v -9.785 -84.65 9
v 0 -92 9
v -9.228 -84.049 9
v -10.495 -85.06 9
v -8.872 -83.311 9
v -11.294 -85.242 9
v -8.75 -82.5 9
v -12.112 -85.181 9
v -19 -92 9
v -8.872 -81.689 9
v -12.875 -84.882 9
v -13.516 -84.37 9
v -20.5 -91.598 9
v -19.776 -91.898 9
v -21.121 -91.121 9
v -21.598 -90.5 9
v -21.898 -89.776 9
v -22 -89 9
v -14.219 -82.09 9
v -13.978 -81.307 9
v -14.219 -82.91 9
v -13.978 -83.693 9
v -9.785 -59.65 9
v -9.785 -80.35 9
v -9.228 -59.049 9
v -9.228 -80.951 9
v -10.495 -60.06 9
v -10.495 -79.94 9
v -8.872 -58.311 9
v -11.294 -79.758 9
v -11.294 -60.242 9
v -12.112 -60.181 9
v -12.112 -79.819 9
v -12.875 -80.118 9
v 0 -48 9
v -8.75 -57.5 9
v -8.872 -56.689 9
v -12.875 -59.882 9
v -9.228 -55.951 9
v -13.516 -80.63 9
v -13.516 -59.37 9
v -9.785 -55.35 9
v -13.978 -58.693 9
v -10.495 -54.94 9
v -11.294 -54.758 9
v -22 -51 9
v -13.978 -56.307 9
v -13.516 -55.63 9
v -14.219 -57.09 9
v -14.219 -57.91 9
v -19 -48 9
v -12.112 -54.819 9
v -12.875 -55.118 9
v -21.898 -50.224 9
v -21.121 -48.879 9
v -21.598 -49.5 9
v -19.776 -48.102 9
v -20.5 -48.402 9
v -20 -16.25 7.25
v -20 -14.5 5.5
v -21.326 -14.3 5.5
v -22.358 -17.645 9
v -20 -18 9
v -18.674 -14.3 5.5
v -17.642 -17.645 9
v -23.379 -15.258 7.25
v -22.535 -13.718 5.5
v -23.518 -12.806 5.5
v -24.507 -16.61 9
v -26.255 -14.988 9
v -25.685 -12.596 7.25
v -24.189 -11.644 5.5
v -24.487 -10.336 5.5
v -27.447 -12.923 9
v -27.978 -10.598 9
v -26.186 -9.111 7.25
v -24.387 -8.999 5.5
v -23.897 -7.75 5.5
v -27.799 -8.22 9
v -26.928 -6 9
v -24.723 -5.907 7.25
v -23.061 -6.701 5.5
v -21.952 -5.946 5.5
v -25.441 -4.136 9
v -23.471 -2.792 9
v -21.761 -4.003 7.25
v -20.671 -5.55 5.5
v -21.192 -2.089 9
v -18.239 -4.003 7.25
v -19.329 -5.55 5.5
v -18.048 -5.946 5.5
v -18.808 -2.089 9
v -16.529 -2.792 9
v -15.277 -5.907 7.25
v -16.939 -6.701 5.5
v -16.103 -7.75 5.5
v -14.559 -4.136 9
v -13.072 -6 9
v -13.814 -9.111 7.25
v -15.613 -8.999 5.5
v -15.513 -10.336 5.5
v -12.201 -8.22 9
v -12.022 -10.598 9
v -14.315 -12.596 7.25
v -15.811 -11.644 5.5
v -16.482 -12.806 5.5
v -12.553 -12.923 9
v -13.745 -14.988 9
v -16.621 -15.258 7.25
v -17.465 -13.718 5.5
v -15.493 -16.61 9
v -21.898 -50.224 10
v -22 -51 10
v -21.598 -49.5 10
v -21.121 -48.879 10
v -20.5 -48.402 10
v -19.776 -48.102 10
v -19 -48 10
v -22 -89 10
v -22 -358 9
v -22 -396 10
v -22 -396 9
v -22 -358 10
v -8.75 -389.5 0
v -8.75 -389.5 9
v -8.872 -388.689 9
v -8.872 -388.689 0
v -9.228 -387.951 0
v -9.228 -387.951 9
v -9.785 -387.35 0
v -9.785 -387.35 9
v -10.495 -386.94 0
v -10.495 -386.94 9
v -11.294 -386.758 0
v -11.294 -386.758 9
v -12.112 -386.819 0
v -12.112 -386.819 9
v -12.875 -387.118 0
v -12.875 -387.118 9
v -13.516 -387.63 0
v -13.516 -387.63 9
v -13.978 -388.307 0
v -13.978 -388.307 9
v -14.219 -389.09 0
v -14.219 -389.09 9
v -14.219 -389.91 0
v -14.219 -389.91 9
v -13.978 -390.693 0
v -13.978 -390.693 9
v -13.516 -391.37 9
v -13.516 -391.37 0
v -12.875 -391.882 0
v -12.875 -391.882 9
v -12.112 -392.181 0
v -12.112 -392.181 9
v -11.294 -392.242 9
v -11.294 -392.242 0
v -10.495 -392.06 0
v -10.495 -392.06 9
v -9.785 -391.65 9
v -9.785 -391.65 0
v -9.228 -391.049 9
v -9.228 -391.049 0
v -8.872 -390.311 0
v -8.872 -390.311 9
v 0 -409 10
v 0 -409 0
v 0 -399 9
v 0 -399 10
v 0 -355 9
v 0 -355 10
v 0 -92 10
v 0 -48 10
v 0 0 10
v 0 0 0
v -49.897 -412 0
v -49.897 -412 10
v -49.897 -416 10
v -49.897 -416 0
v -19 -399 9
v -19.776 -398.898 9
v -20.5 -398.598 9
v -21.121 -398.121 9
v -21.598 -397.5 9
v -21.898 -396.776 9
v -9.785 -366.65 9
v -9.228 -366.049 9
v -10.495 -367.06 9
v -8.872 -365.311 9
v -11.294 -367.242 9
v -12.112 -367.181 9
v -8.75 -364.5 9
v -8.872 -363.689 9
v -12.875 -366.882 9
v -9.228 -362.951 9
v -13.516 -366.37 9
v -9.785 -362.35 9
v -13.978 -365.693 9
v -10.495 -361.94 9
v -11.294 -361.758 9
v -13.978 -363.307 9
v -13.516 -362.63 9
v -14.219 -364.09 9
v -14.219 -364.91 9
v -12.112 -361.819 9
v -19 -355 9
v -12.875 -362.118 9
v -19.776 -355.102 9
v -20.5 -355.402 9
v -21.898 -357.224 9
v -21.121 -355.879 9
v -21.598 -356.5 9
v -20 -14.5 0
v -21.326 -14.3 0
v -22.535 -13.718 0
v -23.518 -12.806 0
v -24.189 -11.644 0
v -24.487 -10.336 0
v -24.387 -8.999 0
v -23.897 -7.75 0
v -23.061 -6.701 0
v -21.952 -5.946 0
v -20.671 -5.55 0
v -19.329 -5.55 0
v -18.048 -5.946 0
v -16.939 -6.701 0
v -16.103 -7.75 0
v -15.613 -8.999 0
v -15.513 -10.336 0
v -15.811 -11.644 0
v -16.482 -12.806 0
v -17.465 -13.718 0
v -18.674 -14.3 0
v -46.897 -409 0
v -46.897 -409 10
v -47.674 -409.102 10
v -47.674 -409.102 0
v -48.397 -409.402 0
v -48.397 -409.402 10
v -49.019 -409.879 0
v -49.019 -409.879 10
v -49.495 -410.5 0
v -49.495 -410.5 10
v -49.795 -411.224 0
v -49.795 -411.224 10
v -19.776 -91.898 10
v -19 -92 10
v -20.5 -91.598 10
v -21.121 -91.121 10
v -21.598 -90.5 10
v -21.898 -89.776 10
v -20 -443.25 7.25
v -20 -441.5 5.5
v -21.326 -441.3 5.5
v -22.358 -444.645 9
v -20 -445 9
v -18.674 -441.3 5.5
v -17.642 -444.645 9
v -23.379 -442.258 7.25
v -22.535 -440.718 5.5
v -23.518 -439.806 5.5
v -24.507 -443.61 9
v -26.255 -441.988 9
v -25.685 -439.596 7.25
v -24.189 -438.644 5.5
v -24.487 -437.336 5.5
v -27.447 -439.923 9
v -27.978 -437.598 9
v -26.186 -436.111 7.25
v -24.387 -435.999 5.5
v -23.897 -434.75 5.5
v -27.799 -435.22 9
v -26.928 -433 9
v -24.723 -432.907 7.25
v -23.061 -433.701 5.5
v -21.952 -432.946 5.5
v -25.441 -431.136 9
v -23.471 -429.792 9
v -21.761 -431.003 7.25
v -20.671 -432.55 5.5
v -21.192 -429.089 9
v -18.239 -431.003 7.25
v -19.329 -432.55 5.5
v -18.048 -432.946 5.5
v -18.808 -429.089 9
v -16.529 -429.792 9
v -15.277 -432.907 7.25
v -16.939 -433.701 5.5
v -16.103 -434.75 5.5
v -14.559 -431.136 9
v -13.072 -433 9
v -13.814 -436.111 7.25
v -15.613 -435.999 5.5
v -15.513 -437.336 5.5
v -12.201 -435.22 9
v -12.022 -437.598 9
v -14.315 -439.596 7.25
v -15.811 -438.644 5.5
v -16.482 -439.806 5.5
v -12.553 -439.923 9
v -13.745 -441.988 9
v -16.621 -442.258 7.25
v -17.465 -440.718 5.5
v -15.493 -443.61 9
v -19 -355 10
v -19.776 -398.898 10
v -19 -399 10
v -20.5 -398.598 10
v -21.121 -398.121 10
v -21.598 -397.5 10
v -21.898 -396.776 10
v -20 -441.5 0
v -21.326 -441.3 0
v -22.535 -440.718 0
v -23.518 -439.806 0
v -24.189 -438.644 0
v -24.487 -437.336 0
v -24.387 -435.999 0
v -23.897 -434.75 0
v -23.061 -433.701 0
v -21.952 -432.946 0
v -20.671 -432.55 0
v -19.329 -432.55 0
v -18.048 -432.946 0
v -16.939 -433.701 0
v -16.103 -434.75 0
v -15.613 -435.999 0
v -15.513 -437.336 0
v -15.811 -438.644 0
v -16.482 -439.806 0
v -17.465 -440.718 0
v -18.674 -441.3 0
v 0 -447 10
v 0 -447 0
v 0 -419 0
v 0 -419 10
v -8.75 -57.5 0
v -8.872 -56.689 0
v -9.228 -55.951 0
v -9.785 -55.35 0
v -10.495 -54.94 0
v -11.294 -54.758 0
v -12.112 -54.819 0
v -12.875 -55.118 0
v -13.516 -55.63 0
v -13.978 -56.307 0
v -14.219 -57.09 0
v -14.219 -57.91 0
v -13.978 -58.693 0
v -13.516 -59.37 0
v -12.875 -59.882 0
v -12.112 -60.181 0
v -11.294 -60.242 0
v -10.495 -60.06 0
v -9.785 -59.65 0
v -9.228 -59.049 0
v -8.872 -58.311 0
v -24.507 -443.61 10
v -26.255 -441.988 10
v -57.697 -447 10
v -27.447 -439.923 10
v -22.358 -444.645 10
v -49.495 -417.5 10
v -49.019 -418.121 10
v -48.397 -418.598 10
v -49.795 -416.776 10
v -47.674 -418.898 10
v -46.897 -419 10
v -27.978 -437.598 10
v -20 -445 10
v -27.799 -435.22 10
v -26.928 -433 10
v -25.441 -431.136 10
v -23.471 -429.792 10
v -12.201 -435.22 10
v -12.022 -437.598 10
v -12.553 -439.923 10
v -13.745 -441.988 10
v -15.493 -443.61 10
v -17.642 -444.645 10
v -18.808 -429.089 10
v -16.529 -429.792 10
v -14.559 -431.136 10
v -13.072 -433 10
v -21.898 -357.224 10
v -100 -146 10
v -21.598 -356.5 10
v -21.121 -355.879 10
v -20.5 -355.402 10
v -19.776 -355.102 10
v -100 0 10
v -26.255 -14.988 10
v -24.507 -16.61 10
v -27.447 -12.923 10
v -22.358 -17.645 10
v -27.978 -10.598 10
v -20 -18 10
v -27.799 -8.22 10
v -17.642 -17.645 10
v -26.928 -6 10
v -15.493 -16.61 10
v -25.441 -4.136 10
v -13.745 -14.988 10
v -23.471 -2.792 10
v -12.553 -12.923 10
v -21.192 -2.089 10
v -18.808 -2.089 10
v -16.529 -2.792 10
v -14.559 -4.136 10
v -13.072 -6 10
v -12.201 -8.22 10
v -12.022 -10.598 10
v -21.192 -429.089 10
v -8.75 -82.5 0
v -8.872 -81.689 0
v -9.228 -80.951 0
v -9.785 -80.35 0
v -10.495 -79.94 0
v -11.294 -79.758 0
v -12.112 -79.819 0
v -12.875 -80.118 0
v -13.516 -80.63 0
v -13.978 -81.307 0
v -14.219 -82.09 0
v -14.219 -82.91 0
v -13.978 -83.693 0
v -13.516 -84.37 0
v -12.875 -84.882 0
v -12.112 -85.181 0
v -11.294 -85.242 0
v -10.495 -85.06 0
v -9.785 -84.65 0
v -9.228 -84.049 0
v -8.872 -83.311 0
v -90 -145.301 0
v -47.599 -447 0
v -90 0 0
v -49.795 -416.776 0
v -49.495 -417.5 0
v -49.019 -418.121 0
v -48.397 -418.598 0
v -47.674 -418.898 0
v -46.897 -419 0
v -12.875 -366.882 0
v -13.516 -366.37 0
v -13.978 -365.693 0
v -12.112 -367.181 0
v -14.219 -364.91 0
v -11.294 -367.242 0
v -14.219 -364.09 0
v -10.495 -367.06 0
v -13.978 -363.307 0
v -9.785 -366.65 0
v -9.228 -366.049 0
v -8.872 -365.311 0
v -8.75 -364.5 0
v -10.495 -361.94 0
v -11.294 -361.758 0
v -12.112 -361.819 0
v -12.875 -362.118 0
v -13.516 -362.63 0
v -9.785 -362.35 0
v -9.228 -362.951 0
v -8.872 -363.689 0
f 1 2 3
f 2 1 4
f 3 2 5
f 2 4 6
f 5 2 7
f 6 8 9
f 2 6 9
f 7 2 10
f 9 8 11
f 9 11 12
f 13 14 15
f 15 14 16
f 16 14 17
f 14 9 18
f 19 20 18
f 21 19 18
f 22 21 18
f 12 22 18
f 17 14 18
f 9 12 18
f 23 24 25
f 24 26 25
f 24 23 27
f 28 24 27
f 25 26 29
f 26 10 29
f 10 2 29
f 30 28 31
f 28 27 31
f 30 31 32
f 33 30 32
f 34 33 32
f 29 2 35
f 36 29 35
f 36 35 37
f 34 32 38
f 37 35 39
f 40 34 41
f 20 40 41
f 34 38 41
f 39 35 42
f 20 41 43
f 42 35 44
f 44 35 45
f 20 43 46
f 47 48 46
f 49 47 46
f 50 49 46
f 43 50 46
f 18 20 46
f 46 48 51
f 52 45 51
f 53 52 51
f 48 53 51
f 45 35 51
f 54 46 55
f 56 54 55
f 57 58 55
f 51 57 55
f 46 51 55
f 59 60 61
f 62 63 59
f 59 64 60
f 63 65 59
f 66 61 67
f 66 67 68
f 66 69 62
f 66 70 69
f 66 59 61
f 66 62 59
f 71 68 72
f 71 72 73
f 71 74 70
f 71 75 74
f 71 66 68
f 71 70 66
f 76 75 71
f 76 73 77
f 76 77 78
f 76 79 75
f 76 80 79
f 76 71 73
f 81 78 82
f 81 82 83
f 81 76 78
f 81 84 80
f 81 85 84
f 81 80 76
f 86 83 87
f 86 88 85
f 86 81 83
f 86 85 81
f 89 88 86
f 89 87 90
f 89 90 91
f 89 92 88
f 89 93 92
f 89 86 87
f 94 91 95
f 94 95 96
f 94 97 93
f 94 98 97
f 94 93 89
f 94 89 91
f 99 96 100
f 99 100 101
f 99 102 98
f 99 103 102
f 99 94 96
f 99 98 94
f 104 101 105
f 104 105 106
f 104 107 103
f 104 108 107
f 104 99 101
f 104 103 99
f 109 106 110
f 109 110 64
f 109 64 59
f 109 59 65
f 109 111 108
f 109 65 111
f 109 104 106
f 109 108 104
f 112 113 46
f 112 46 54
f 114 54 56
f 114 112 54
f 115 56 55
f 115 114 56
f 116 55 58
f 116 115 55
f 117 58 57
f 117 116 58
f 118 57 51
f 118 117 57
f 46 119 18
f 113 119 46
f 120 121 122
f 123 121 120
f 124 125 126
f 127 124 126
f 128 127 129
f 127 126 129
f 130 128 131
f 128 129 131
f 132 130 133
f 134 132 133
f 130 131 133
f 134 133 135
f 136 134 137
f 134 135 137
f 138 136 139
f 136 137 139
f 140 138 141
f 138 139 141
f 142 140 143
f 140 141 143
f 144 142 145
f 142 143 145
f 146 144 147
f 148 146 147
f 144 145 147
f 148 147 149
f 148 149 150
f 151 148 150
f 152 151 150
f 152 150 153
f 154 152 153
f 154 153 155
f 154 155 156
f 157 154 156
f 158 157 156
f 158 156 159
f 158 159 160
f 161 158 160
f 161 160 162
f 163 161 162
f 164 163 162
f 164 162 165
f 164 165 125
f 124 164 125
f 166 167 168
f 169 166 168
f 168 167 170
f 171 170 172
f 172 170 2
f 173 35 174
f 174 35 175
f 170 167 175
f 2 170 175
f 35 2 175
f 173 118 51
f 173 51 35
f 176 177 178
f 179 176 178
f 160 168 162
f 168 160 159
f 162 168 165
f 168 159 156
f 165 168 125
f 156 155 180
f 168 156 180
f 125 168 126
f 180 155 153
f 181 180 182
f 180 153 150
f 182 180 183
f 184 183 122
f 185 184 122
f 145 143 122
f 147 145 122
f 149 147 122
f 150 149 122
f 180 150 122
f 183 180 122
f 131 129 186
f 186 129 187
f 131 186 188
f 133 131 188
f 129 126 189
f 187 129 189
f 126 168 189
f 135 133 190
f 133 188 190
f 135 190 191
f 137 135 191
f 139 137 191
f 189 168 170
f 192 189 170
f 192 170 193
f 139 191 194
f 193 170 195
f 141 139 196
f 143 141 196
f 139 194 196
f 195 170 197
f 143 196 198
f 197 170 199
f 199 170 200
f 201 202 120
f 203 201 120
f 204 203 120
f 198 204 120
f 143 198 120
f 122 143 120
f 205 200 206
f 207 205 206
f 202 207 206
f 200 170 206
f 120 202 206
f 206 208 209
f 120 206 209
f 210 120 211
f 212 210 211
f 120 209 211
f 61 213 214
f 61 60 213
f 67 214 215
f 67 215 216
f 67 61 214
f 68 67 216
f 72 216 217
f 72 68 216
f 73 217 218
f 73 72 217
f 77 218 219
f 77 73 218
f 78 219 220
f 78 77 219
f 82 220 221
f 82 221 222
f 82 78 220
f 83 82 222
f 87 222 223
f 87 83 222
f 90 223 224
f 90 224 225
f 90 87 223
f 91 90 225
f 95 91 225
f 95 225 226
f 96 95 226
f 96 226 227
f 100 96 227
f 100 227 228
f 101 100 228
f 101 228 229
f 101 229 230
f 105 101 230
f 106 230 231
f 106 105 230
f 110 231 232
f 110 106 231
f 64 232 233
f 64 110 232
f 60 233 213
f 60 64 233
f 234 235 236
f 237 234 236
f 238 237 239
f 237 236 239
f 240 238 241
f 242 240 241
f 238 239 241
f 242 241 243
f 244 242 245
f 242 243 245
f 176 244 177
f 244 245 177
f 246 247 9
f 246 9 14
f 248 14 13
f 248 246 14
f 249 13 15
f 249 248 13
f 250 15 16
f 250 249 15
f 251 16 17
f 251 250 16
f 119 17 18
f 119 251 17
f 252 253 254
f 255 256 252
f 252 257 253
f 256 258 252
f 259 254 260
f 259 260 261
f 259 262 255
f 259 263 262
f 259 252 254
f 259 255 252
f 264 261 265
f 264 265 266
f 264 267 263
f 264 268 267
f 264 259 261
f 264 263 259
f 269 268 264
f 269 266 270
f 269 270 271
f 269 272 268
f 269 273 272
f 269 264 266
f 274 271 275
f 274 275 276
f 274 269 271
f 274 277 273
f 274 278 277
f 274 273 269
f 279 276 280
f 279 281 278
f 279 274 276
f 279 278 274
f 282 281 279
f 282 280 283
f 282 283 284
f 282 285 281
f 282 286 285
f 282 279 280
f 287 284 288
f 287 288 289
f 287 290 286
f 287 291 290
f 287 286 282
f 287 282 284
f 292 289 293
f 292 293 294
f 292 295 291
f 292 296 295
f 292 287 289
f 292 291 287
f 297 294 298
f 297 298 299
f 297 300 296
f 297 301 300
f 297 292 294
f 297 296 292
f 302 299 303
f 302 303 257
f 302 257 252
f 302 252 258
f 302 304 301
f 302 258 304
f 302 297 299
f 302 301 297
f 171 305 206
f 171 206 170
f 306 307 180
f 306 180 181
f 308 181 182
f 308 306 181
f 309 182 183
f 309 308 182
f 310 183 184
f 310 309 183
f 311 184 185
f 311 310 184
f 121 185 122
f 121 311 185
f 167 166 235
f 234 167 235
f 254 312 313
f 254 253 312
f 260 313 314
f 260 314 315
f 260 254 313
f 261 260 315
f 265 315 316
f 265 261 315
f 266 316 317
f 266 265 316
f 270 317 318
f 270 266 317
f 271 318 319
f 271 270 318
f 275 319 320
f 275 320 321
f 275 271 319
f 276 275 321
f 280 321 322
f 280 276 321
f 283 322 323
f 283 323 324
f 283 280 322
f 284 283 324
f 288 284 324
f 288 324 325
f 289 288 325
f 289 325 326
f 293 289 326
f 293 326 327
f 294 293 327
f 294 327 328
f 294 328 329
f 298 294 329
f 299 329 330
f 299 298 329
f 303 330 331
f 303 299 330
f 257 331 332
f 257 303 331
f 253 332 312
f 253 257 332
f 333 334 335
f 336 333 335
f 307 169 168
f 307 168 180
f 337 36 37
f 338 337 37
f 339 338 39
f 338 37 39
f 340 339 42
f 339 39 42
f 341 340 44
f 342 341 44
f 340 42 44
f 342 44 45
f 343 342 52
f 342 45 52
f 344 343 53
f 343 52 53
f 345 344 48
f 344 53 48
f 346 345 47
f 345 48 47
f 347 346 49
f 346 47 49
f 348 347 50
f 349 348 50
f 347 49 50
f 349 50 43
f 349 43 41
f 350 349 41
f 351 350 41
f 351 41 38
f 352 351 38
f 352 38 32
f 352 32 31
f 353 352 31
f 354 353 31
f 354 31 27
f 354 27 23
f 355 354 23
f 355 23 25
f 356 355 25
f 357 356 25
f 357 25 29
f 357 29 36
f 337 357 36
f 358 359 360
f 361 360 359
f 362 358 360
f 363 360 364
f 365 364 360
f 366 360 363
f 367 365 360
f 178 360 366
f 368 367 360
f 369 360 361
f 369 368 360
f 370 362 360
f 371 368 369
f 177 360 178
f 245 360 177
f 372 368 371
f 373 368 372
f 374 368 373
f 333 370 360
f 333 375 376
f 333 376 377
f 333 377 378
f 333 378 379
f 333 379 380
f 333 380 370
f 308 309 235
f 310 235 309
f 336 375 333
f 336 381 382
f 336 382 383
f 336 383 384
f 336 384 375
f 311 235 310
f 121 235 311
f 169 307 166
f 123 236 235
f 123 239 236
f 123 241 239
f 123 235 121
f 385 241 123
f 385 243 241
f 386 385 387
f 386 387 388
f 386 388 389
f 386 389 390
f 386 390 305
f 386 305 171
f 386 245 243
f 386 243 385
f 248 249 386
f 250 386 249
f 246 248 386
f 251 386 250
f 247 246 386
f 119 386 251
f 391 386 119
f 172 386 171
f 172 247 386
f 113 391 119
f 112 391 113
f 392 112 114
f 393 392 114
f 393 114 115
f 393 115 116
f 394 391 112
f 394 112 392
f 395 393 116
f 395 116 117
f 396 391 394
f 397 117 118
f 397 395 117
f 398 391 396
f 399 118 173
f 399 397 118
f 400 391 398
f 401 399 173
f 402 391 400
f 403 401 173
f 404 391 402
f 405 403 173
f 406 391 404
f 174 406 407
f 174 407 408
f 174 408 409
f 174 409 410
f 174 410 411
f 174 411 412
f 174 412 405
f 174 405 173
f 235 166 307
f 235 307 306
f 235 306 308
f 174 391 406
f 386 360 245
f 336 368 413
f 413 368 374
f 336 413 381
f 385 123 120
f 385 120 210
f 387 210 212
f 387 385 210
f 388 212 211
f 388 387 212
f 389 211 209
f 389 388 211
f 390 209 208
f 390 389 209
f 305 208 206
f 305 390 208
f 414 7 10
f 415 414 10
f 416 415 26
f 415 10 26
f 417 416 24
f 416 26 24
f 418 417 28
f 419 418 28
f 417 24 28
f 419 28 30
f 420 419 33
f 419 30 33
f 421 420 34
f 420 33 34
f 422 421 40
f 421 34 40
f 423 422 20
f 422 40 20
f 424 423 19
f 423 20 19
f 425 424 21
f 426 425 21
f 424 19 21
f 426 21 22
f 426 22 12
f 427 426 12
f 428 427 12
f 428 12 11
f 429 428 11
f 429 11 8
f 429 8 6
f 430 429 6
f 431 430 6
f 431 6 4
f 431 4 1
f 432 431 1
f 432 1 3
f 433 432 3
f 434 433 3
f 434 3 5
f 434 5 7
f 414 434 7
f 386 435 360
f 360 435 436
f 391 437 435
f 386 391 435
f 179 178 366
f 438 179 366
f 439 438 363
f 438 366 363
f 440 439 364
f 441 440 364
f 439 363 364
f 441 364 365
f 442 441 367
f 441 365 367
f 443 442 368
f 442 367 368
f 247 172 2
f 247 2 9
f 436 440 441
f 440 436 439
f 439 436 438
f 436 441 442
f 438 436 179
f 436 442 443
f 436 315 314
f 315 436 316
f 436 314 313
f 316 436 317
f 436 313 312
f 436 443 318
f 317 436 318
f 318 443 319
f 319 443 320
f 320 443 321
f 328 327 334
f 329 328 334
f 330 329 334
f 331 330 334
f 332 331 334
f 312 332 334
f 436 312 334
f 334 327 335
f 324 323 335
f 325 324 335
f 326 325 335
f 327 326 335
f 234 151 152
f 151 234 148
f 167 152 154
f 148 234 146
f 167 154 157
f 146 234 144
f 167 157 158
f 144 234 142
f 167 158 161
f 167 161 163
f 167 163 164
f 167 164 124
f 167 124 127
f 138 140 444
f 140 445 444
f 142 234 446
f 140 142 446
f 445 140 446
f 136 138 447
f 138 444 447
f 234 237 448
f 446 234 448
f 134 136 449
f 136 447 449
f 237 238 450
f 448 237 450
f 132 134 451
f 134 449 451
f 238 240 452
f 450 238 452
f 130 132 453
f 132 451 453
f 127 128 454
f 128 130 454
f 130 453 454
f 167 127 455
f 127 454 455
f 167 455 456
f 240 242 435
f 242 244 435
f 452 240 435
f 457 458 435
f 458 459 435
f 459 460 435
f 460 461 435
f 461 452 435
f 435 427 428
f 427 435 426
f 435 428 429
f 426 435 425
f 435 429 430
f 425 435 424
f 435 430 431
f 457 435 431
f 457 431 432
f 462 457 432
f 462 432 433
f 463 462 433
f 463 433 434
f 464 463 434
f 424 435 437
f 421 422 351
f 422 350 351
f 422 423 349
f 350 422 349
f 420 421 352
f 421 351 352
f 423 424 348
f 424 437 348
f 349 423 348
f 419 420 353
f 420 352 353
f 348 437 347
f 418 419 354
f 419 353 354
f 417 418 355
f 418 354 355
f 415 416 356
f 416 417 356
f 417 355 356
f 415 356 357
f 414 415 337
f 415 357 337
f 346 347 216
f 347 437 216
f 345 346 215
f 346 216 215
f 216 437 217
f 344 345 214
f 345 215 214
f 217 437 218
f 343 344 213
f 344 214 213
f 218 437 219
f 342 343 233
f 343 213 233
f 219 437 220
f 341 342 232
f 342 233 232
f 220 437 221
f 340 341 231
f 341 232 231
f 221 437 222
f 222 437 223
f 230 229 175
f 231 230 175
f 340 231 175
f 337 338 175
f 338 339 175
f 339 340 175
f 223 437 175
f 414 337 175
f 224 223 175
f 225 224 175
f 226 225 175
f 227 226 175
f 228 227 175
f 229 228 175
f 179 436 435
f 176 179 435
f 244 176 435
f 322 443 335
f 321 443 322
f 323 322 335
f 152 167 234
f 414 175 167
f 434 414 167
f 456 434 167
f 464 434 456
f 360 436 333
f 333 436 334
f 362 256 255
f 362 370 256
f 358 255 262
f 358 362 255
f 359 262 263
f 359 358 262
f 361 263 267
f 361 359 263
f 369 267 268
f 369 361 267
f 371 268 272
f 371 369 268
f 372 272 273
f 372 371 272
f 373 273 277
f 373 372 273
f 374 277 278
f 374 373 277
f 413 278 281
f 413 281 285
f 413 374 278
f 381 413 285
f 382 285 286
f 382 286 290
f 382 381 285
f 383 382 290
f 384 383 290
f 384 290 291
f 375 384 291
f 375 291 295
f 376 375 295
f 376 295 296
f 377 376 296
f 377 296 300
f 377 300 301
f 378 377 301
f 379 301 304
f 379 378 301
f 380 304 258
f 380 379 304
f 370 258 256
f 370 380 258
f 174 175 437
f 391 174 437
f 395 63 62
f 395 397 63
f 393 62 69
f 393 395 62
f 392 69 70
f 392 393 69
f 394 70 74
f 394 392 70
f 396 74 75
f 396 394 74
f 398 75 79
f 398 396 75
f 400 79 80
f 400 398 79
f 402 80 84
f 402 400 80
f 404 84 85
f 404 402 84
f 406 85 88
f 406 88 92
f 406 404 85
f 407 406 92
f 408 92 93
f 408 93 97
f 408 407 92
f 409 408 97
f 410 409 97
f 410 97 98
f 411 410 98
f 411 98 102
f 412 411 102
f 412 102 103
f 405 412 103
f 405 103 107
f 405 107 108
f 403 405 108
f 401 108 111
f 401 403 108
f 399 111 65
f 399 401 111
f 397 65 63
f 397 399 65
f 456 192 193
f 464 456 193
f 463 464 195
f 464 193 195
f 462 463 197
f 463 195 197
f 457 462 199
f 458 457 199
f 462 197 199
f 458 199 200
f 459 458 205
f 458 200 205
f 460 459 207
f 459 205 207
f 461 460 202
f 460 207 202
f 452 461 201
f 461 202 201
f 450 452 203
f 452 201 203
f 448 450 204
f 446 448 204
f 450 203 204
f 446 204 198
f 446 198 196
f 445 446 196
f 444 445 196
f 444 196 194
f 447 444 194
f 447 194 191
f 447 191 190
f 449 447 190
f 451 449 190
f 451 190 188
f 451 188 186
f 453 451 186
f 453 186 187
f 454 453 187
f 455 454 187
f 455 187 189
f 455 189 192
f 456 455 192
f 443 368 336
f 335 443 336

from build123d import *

# Parameters (mm, degrees)
BOSS_EXTRUDE1_DEPTH                          = 10
CHAMFER1_SIZE                                = 10
CSK_FOR_M8_HEX_SOCKET_COUNTERSUNK_HE_2_COUNT = 2
CSK_FOR_M8_HEX_SOCKET_COUNTERSUNK_HE_2_PITCH = 427
CUT_EXTRUDE1_DEPTH                           = 30
CUT_EXTRUDE2_DEPTH                           = 1
SKETCH6_R                                    = 2.75
CUT_EXTRUDE3_DEPTH                           = 459.137533935


with BuildPart() as part:
    # Sketch1 → Boss-Extrude1 (new body)
    with BuildSketch(Plane.XY):
        Polygon((0, 0), (-100, 0), (-100, -146), (-57.697208755, -447), (0, -447), align=None)
    extrude(amount=BOSS_EXTRUDE1_DEPTH)

    # Chamfer1
    chamfer1_edges = [part.edges().sort_by_distance(p)[0] for p in [
        (-78.848604377, -296.5, 0),
        (-100, -73, 0),
    ]]
    chamfer(chamfer1_edges, length=CHAMFER1_SIZE - 0.0001)  # a hair under: the kernel refuses the full size

    # Sketch3 → CSK for M8 Hex Socket Countersunk Head Screw1 (revolve, cut)
    with BuildSketch(Plane(origin=(-20, -10, 10), x_dir=(0, -1, 0), z_dir=(1, 0, 0))):
        Polygon((0, 0), (0, 10), (4.5, 10), (4.5, 4.5), (8, 1), (8, 0), align=None)
    csk_for_m8_hex_socket_countersunk_head_s = revolve(axis=Axis((-20, -10, 16.35), (0, 0, -1)), mode=Mode.SUBTRACT)

    # CSK for M8 Hex Socket Countersunk He 2: CSK for M8 Hex Socket Countersunk Head Screw1 ×2
    with Locations(*[(0, -i * CSK_FOR_M8_HEX_SOCKET_COUNTERSUNK_HE_2_PITCH, 0) for i in range(1, CSK_FOR_M8_HEX_SOCKET_COUNTERSUNK_HE_2_COUNT)]):
        add(csk_for_m8_hex_socket_countersunk_head_s, mode=Mode.SUBTRACT)

    # Sketch4 → Cut-Extrude1 (cut)
    with BuildSketch(Plane.XY.offset(10)):
        with BuildLine():
            Line((0, -409), (-46.897208755, -409))
            ThreePointArc((-46.897208755, -409), (-49.018529098, -409.878679656), (-49.897208755, -412))
            Line((-49.897208755, -412), (-49.897208755, -416))
            ThreePointArc((-49.897208755, -416), (-49.018529098, -418.121320344), (-46.897208755, -419))
            Line((-46.897208755, -419), (0, -419))
            Line((0, -419), (0, -409))
        make_face()
    extrude(amount=-CUT_EXTRUDE1_DEPTH, mode=Mode.SUBTRACT)

    # Sketch5 → Cut-Extrude2 (cut)
    with BuildSketch(Plane.XY.offset(10)):
        with BuildLine():
            Line((-19, -48), (0, -48))
            Line((0, -48), (0, -92))
            Line((0, -92), (-19, -92))
            ThreePointArc((-19, -92), (-21.121320344, -91.121320344), (-22, -89))
            Line((-22, -89), (-22, -51))
            ThreePointArc((-22, -51), (-21.121320344, -48.878679656), (-19, -48))
        make_face()
        with BuildLine():
            Line((-19, -355), (0, -355))
            Line((0, -355), (0, -399))
            Line((0, -399), (-19, -399))
            ThreePointArc((-19, -399), (-21.121320344, -398.121320344), (-22, -396))
            Line((-22, -396), (-22, -358))
            ThreePointArc((-22, -358), (-21.121320344, -355.878679656), (-19, -355))
        make_face()
    extrude(amount=-CUT_EXTRUDE2_DEPTH, mode=Mode.SUBTRACT)

    # Sketch6 → Cut-Extrude3 (cut, through all)
    with BuildSketch(Plane.XY.offset(9)):
        with Locations((-11.5, -57.5)):
            Circle(SKETCH6_R)
        with Locations((-11.5, -82.5)):
            Circle(SKETCH6_R)
        with Locations((-11.5, -364.5)):
            Circle(SKETCH6_R)
        with Locations((-11.5, -389.5)):
            Circle(SKETCH6_R)
    extrude(amount=-CUT_EXTRUDE3_DEPTH, mode=Mode.SUBTRACT)


solid = part.part
